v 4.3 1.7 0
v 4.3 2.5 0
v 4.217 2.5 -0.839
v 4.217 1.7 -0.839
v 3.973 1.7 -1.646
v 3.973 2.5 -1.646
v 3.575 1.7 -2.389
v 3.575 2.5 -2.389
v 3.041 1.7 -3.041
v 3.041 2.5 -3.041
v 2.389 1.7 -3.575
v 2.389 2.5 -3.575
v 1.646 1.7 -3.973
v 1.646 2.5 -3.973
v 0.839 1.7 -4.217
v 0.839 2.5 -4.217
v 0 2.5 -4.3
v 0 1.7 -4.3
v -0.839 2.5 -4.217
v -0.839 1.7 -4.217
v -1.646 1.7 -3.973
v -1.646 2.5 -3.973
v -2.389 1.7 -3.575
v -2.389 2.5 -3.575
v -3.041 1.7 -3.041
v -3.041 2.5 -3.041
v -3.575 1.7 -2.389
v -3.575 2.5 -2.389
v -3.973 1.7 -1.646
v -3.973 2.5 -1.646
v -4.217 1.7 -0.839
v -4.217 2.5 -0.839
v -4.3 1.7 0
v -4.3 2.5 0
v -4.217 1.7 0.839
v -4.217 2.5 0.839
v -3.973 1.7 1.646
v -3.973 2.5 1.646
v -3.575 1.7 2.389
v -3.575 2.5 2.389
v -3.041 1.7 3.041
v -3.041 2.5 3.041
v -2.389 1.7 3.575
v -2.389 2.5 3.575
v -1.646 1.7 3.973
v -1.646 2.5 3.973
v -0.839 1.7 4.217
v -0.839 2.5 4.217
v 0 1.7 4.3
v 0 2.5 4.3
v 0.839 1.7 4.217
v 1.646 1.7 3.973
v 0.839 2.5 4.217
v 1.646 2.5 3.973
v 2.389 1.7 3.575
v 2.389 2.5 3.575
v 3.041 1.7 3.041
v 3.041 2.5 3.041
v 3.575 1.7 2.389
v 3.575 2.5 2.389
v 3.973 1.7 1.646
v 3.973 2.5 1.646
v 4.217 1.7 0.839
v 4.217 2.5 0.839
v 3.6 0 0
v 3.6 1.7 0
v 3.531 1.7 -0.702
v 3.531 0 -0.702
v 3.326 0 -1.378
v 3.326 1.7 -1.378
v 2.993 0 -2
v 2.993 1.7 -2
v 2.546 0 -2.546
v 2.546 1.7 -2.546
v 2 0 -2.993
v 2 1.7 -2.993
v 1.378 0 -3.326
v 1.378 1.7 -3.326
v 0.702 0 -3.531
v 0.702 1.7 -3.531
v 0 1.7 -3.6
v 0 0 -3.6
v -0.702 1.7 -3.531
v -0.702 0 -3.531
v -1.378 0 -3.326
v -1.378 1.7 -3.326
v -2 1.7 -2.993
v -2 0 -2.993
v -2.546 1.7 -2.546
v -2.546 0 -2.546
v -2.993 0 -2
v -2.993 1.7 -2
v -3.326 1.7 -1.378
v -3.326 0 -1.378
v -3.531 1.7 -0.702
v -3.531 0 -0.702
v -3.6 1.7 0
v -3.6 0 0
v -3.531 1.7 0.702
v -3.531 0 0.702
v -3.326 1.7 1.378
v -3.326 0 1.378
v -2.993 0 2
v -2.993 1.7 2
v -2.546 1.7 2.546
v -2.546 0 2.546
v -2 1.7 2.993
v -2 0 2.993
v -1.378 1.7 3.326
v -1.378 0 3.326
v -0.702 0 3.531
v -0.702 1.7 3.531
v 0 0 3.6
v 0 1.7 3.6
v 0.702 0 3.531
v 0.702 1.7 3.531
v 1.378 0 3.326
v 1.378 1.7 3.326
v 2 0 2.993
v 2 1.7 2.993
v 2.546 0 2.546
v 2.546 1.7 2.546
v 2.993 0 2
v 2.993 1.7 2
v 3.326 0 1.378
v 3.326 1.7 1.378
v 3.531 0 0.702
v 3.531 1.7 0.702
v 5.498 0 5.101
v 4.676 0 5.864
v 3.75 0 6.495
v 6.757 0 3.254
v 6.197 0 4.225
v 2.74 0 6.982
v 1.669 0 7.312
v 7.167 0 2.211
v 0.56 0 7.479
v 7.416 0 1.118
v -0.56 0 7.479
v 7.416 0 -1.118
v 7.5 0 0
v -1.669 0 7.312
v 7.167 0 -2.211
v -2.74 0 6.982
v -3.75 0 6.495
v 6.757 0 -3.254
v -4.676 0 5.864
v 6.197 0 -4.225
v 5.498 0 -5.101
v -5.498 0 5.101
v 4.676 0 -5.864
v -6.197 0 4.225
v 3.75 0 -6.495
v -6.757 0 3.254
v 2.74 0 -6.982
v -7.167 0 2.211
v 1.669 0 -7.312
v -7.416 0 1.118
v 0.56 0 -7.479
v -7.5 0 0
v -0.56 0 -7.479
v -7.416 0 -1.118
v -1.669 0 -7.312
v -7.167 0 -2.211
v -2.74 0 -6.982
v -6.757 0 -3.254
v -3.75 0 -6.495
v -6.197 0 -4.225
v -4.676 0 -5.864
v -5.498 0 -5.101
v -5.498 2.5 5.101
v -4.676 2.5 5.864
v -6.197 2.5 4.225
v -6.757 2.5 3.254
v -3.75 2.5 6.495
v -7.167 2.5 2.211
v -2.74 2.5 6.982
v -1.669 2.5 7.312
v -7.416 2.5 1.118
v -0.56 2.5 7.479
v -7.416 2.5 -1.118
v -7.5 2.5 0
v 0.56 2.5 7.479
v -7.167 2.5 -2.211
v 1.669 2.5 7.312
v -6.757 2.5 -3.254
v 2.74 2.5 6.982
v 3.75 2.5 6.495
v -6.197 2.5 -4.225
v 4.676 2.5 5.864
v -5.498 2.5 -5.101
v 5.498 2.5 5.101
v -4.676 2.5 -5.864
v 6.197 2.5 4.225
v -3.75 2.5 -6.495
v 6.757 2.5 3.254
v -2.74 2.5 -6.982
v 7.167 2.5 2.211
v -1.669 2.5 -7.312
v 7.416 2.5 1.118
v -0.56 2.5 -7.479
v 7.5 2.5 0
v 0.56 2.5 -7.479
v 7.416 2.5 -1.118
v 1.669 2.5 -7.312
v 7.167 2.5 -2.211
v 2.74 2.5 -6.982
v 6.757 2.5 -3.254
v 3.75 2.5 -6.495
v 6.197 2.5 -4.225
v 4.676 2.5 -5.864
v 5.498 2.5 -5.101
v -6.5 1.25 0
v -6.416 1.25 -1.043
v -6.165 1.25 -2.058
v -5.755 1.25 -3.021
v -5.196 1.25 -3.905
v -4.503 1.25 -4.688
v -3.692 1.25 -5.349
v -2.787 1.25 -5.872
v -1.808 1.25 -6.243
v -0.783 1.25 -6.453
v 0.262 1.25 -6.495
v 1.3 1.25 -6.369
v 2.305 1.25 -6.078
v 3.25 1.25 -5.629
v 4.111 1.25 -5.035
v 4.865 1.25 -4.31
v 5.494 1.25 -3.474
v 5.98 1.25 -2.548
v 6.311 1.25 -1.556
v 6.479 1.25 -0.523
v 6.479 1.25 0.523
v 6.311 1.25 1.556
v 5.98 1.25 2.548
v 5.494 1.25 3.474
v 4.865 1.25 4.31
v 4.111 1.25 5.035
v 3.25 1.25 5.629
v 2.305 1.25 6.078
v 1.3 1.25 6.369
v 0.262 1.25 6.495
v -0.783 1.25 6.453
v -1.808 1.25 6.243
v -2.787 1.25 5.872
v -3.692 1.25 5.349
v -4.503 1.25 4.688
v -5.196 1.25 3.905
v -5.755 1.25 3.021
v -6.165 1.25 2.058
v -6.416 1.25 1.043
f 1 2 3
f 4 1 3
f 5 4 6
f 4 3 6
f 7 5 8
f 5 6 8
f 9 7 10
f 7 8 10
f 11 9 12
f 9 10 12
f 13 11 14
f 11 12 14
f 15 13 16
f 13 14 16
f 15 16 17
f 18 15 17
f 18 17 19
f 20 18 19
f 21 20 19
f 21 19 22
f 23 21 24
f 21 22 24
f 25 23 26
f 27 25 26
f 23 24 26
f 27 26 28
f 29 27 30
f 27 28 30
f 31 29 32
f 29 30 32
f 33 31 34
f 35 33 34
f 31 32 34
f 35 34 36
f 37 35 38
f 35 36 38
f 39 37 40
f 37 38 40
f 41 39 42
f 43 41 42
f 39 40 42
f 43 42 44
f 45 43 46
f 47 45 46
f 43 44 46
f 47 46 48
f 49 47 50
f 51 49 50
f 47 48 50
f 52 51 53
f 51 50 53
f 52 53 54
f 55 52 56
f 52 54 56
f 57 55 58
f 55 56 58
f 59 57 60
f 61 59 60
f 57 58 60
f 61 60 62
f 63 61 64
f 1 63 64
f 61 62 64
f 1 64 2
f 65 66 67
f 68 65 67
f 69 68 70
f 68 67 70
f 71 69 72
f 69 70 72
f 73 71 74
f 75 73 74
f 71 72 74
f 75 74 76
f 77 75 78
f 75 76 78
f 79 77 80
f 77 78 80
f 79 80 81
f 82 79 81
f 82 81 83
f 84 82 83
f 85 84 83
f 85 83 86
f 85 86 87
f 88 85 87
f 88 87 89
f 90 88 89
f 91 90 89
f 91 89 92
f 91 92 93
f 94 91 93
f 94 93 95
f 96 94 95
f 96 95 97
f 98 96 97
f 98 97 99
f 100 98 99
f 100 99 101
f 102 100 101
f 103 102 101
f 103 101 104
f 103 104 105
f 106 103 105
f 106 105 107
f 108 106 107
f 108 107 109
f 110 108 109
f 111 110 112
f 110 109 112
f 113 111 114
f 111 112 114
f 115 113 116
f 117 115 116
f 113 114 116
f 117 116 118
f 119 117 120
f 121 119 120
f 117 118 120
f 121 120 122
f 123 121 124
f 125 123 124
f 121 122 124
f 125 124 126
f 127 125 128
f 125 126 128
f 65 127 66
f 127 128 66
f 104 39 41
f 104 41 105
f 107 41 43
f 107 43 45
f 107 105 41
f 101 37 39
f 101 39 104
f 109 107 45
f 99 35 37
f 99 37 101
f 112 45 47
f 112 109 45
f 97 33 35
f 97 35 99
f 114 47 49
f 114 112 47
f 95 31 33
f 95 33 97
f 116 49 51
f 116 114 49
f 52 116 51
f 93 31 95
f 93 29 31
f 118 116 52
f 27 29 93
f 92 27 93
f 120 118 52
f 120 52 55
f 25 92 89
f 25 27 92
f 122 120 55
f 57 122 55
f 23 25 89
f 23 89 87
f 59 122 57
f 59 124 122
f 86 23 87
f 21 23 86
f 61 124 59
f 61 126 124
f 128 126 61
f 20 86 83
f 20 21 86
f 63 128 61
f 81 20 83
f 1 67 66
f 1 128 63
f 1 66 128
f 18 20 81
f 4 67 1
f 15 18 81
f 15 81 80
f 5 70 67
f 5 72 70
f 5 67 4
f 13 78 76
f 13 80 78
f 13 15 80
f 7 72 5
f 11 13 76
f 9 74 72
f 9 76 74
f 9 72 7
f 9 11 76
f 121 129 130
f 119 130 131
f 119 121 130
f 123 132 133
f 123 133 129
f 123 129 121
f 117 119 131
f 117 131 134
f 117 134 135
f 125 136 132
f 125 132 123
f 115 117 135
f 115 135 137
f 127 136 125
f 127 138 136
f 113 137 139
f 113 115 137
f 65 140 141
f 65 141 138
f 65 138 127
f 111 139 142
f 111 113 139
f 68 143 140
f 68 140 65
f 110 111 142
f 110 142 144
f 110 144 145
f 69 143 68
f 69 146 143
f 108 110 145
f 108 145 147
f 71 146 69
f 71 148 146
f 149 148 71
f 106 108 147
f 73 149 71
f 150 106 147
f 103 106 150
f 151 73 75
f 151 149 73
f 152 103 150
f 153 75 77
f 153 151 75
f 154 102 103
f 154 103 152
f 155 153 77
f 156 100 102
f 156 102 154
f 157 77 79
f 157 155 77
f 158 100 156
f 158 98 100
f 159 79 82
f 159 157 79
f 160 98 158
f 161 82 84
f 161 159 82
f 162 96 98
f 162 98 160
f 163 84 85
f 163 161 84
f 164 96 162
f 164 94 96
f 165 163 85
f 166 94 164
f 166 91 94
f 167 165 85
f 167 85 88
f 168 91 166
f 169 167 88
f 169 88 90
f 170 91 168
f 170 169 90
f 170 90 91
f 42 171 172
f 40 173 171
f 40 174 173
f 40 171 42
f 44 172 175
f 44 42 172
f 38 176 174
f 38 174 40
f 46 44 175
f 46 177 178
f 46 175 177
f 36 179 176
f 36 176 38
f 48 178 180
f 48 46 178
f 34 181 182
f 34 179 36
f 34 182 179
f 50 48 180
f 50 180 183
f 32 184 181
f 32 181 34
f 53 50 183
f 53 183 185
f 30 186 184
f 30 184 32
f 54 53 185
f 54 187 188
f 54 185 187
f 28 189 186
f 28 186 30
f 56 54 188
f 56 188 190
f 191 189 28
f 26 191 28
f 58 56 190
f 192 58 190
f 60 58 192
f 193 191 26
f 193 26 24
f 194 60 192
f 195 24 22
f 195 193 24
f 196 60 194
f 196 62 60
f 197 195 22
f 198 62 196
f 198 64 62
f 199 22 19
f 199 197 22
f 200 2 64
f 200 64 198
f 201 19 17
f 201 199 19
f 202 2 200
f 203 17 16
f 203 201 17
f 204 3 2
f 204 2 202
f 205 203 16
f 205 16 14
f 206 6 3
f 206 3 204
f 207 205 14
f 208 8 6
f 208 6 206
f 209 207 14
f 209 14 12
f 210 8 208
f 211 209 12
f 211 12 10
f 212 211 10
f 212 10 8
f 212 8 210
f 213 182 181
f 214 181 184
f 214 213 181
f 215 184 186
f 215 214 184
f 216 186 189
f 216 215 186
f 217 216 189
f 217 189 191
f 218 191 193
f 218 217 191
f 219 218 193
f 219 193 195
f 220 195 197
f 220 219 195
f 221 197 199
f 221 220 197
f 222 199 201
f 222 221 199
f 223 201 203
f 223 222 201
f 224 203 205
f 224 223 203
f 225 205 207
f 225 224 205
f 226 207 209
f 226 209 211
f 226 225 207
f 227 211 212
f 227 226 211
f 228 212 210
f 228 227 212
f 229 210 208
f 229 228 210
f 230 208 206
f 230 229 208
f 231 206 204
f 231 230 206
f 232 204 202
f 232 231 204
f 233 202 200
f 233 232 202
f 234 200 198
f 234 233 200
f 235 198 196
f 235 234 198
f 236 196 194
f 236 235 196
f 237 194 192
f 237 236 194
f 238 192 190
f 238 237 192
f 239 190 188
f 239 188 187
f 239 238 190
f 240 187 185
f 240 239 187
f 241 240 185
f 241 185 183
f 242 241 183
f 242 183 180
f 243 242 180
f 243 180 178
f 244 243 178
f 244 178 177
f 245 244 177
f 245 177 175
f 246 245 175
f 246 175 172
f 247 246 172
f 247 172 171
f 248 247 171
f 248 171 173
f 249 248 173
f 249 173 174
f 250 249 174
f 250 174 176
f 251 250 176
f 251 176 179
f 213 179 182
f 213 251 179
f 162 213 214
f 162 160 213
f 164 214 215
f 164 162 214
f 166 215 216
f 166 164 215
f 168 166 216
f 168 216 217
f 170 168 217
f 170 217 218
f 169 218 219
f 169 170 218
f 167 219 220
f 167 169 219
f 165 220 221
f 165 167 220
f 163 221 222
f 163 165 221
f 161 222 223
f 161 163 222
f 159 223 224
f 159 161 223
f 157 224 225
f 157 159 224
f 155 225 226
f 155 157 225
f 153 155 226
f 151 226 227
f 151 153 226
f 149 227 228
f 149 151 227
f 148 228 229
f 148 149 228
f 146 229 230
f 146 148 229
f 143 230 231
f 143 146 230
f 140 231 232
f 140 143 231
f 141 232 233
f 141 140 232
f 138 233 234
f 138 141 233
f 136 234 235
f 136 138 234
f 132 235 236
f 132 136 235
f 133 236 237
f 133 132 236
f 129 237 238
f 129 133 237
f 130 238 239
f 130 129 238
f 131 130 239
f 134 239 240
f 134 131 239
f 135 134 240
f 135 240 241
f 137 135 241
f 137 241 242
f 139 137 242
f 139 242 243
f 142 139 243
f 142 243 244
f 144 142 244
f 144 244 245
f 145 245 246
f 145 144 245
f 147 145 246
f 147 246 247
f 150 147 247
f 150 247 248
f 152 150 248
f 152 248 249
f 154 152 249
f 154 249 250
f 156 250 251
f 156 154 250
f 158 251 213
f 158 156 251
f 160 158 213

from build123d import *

# Parameters (mm, degrees)
SKETCH_2_R          = 2
CUT_EXTRUDE_1_DEPTH = 2.5
SKETCH_3_R          = 3.6
CUT_EXTRUDE_2_DEPTH = 2.5
SKETCH_4_R          = 4.3
CUT_EXTRUDE_3_DEPTH = 0.8


with BuildPart() as part:
    # 스케치1 → 회전1 (revolve)
    with BuildSketch(Plane.XY):
        Polygon((0, 0), (0, 2.5), (-7.5, 2.5), (-6.5, 1.25), (-7.5, 0), align=None)
    revolve(axis=Axis((0, 2.5, 0), (0, -1, 0)))

    # 스케치2 → 컷-돌출1 (cut)
    with BuildSketch(Plane(origin=(0, 2.5, 0), x_dir=(1, 0, 0), z_dir=(0, 1, 0))):
        Circle(SKETCH_2_R)
    extrude(amount=-CUT_EXTRUDE_1_DEPTH, mode=Mode.SUBTRACT)

    # 스케치3 → 컷-돌출2 (cut)
    with BuildSketch(Plane(origin=(0, 2.5, 0), x_dir=(1, 0, 0), z_dir=(0, 1, 0))):
        Circle(SKETCH_3_R)
    extrude(amount=-CUT_EXTRUDE_2_DEPTH, mode=Mode.SUBTRACT)

    # 스케치4 → 컷-돌출3 (cut)
    with BuildSketch(Plane(origin=(0, 2.5, 0), x_dir=(1, 0, 0), z_dir=(0, 1, 0))):
        Circle(SKETCH_4_R)
    extrude(amount=-CUT_EXTRUDE_3_DEPTH, mode=Mode.SUBTRACT)


solid = part.part
